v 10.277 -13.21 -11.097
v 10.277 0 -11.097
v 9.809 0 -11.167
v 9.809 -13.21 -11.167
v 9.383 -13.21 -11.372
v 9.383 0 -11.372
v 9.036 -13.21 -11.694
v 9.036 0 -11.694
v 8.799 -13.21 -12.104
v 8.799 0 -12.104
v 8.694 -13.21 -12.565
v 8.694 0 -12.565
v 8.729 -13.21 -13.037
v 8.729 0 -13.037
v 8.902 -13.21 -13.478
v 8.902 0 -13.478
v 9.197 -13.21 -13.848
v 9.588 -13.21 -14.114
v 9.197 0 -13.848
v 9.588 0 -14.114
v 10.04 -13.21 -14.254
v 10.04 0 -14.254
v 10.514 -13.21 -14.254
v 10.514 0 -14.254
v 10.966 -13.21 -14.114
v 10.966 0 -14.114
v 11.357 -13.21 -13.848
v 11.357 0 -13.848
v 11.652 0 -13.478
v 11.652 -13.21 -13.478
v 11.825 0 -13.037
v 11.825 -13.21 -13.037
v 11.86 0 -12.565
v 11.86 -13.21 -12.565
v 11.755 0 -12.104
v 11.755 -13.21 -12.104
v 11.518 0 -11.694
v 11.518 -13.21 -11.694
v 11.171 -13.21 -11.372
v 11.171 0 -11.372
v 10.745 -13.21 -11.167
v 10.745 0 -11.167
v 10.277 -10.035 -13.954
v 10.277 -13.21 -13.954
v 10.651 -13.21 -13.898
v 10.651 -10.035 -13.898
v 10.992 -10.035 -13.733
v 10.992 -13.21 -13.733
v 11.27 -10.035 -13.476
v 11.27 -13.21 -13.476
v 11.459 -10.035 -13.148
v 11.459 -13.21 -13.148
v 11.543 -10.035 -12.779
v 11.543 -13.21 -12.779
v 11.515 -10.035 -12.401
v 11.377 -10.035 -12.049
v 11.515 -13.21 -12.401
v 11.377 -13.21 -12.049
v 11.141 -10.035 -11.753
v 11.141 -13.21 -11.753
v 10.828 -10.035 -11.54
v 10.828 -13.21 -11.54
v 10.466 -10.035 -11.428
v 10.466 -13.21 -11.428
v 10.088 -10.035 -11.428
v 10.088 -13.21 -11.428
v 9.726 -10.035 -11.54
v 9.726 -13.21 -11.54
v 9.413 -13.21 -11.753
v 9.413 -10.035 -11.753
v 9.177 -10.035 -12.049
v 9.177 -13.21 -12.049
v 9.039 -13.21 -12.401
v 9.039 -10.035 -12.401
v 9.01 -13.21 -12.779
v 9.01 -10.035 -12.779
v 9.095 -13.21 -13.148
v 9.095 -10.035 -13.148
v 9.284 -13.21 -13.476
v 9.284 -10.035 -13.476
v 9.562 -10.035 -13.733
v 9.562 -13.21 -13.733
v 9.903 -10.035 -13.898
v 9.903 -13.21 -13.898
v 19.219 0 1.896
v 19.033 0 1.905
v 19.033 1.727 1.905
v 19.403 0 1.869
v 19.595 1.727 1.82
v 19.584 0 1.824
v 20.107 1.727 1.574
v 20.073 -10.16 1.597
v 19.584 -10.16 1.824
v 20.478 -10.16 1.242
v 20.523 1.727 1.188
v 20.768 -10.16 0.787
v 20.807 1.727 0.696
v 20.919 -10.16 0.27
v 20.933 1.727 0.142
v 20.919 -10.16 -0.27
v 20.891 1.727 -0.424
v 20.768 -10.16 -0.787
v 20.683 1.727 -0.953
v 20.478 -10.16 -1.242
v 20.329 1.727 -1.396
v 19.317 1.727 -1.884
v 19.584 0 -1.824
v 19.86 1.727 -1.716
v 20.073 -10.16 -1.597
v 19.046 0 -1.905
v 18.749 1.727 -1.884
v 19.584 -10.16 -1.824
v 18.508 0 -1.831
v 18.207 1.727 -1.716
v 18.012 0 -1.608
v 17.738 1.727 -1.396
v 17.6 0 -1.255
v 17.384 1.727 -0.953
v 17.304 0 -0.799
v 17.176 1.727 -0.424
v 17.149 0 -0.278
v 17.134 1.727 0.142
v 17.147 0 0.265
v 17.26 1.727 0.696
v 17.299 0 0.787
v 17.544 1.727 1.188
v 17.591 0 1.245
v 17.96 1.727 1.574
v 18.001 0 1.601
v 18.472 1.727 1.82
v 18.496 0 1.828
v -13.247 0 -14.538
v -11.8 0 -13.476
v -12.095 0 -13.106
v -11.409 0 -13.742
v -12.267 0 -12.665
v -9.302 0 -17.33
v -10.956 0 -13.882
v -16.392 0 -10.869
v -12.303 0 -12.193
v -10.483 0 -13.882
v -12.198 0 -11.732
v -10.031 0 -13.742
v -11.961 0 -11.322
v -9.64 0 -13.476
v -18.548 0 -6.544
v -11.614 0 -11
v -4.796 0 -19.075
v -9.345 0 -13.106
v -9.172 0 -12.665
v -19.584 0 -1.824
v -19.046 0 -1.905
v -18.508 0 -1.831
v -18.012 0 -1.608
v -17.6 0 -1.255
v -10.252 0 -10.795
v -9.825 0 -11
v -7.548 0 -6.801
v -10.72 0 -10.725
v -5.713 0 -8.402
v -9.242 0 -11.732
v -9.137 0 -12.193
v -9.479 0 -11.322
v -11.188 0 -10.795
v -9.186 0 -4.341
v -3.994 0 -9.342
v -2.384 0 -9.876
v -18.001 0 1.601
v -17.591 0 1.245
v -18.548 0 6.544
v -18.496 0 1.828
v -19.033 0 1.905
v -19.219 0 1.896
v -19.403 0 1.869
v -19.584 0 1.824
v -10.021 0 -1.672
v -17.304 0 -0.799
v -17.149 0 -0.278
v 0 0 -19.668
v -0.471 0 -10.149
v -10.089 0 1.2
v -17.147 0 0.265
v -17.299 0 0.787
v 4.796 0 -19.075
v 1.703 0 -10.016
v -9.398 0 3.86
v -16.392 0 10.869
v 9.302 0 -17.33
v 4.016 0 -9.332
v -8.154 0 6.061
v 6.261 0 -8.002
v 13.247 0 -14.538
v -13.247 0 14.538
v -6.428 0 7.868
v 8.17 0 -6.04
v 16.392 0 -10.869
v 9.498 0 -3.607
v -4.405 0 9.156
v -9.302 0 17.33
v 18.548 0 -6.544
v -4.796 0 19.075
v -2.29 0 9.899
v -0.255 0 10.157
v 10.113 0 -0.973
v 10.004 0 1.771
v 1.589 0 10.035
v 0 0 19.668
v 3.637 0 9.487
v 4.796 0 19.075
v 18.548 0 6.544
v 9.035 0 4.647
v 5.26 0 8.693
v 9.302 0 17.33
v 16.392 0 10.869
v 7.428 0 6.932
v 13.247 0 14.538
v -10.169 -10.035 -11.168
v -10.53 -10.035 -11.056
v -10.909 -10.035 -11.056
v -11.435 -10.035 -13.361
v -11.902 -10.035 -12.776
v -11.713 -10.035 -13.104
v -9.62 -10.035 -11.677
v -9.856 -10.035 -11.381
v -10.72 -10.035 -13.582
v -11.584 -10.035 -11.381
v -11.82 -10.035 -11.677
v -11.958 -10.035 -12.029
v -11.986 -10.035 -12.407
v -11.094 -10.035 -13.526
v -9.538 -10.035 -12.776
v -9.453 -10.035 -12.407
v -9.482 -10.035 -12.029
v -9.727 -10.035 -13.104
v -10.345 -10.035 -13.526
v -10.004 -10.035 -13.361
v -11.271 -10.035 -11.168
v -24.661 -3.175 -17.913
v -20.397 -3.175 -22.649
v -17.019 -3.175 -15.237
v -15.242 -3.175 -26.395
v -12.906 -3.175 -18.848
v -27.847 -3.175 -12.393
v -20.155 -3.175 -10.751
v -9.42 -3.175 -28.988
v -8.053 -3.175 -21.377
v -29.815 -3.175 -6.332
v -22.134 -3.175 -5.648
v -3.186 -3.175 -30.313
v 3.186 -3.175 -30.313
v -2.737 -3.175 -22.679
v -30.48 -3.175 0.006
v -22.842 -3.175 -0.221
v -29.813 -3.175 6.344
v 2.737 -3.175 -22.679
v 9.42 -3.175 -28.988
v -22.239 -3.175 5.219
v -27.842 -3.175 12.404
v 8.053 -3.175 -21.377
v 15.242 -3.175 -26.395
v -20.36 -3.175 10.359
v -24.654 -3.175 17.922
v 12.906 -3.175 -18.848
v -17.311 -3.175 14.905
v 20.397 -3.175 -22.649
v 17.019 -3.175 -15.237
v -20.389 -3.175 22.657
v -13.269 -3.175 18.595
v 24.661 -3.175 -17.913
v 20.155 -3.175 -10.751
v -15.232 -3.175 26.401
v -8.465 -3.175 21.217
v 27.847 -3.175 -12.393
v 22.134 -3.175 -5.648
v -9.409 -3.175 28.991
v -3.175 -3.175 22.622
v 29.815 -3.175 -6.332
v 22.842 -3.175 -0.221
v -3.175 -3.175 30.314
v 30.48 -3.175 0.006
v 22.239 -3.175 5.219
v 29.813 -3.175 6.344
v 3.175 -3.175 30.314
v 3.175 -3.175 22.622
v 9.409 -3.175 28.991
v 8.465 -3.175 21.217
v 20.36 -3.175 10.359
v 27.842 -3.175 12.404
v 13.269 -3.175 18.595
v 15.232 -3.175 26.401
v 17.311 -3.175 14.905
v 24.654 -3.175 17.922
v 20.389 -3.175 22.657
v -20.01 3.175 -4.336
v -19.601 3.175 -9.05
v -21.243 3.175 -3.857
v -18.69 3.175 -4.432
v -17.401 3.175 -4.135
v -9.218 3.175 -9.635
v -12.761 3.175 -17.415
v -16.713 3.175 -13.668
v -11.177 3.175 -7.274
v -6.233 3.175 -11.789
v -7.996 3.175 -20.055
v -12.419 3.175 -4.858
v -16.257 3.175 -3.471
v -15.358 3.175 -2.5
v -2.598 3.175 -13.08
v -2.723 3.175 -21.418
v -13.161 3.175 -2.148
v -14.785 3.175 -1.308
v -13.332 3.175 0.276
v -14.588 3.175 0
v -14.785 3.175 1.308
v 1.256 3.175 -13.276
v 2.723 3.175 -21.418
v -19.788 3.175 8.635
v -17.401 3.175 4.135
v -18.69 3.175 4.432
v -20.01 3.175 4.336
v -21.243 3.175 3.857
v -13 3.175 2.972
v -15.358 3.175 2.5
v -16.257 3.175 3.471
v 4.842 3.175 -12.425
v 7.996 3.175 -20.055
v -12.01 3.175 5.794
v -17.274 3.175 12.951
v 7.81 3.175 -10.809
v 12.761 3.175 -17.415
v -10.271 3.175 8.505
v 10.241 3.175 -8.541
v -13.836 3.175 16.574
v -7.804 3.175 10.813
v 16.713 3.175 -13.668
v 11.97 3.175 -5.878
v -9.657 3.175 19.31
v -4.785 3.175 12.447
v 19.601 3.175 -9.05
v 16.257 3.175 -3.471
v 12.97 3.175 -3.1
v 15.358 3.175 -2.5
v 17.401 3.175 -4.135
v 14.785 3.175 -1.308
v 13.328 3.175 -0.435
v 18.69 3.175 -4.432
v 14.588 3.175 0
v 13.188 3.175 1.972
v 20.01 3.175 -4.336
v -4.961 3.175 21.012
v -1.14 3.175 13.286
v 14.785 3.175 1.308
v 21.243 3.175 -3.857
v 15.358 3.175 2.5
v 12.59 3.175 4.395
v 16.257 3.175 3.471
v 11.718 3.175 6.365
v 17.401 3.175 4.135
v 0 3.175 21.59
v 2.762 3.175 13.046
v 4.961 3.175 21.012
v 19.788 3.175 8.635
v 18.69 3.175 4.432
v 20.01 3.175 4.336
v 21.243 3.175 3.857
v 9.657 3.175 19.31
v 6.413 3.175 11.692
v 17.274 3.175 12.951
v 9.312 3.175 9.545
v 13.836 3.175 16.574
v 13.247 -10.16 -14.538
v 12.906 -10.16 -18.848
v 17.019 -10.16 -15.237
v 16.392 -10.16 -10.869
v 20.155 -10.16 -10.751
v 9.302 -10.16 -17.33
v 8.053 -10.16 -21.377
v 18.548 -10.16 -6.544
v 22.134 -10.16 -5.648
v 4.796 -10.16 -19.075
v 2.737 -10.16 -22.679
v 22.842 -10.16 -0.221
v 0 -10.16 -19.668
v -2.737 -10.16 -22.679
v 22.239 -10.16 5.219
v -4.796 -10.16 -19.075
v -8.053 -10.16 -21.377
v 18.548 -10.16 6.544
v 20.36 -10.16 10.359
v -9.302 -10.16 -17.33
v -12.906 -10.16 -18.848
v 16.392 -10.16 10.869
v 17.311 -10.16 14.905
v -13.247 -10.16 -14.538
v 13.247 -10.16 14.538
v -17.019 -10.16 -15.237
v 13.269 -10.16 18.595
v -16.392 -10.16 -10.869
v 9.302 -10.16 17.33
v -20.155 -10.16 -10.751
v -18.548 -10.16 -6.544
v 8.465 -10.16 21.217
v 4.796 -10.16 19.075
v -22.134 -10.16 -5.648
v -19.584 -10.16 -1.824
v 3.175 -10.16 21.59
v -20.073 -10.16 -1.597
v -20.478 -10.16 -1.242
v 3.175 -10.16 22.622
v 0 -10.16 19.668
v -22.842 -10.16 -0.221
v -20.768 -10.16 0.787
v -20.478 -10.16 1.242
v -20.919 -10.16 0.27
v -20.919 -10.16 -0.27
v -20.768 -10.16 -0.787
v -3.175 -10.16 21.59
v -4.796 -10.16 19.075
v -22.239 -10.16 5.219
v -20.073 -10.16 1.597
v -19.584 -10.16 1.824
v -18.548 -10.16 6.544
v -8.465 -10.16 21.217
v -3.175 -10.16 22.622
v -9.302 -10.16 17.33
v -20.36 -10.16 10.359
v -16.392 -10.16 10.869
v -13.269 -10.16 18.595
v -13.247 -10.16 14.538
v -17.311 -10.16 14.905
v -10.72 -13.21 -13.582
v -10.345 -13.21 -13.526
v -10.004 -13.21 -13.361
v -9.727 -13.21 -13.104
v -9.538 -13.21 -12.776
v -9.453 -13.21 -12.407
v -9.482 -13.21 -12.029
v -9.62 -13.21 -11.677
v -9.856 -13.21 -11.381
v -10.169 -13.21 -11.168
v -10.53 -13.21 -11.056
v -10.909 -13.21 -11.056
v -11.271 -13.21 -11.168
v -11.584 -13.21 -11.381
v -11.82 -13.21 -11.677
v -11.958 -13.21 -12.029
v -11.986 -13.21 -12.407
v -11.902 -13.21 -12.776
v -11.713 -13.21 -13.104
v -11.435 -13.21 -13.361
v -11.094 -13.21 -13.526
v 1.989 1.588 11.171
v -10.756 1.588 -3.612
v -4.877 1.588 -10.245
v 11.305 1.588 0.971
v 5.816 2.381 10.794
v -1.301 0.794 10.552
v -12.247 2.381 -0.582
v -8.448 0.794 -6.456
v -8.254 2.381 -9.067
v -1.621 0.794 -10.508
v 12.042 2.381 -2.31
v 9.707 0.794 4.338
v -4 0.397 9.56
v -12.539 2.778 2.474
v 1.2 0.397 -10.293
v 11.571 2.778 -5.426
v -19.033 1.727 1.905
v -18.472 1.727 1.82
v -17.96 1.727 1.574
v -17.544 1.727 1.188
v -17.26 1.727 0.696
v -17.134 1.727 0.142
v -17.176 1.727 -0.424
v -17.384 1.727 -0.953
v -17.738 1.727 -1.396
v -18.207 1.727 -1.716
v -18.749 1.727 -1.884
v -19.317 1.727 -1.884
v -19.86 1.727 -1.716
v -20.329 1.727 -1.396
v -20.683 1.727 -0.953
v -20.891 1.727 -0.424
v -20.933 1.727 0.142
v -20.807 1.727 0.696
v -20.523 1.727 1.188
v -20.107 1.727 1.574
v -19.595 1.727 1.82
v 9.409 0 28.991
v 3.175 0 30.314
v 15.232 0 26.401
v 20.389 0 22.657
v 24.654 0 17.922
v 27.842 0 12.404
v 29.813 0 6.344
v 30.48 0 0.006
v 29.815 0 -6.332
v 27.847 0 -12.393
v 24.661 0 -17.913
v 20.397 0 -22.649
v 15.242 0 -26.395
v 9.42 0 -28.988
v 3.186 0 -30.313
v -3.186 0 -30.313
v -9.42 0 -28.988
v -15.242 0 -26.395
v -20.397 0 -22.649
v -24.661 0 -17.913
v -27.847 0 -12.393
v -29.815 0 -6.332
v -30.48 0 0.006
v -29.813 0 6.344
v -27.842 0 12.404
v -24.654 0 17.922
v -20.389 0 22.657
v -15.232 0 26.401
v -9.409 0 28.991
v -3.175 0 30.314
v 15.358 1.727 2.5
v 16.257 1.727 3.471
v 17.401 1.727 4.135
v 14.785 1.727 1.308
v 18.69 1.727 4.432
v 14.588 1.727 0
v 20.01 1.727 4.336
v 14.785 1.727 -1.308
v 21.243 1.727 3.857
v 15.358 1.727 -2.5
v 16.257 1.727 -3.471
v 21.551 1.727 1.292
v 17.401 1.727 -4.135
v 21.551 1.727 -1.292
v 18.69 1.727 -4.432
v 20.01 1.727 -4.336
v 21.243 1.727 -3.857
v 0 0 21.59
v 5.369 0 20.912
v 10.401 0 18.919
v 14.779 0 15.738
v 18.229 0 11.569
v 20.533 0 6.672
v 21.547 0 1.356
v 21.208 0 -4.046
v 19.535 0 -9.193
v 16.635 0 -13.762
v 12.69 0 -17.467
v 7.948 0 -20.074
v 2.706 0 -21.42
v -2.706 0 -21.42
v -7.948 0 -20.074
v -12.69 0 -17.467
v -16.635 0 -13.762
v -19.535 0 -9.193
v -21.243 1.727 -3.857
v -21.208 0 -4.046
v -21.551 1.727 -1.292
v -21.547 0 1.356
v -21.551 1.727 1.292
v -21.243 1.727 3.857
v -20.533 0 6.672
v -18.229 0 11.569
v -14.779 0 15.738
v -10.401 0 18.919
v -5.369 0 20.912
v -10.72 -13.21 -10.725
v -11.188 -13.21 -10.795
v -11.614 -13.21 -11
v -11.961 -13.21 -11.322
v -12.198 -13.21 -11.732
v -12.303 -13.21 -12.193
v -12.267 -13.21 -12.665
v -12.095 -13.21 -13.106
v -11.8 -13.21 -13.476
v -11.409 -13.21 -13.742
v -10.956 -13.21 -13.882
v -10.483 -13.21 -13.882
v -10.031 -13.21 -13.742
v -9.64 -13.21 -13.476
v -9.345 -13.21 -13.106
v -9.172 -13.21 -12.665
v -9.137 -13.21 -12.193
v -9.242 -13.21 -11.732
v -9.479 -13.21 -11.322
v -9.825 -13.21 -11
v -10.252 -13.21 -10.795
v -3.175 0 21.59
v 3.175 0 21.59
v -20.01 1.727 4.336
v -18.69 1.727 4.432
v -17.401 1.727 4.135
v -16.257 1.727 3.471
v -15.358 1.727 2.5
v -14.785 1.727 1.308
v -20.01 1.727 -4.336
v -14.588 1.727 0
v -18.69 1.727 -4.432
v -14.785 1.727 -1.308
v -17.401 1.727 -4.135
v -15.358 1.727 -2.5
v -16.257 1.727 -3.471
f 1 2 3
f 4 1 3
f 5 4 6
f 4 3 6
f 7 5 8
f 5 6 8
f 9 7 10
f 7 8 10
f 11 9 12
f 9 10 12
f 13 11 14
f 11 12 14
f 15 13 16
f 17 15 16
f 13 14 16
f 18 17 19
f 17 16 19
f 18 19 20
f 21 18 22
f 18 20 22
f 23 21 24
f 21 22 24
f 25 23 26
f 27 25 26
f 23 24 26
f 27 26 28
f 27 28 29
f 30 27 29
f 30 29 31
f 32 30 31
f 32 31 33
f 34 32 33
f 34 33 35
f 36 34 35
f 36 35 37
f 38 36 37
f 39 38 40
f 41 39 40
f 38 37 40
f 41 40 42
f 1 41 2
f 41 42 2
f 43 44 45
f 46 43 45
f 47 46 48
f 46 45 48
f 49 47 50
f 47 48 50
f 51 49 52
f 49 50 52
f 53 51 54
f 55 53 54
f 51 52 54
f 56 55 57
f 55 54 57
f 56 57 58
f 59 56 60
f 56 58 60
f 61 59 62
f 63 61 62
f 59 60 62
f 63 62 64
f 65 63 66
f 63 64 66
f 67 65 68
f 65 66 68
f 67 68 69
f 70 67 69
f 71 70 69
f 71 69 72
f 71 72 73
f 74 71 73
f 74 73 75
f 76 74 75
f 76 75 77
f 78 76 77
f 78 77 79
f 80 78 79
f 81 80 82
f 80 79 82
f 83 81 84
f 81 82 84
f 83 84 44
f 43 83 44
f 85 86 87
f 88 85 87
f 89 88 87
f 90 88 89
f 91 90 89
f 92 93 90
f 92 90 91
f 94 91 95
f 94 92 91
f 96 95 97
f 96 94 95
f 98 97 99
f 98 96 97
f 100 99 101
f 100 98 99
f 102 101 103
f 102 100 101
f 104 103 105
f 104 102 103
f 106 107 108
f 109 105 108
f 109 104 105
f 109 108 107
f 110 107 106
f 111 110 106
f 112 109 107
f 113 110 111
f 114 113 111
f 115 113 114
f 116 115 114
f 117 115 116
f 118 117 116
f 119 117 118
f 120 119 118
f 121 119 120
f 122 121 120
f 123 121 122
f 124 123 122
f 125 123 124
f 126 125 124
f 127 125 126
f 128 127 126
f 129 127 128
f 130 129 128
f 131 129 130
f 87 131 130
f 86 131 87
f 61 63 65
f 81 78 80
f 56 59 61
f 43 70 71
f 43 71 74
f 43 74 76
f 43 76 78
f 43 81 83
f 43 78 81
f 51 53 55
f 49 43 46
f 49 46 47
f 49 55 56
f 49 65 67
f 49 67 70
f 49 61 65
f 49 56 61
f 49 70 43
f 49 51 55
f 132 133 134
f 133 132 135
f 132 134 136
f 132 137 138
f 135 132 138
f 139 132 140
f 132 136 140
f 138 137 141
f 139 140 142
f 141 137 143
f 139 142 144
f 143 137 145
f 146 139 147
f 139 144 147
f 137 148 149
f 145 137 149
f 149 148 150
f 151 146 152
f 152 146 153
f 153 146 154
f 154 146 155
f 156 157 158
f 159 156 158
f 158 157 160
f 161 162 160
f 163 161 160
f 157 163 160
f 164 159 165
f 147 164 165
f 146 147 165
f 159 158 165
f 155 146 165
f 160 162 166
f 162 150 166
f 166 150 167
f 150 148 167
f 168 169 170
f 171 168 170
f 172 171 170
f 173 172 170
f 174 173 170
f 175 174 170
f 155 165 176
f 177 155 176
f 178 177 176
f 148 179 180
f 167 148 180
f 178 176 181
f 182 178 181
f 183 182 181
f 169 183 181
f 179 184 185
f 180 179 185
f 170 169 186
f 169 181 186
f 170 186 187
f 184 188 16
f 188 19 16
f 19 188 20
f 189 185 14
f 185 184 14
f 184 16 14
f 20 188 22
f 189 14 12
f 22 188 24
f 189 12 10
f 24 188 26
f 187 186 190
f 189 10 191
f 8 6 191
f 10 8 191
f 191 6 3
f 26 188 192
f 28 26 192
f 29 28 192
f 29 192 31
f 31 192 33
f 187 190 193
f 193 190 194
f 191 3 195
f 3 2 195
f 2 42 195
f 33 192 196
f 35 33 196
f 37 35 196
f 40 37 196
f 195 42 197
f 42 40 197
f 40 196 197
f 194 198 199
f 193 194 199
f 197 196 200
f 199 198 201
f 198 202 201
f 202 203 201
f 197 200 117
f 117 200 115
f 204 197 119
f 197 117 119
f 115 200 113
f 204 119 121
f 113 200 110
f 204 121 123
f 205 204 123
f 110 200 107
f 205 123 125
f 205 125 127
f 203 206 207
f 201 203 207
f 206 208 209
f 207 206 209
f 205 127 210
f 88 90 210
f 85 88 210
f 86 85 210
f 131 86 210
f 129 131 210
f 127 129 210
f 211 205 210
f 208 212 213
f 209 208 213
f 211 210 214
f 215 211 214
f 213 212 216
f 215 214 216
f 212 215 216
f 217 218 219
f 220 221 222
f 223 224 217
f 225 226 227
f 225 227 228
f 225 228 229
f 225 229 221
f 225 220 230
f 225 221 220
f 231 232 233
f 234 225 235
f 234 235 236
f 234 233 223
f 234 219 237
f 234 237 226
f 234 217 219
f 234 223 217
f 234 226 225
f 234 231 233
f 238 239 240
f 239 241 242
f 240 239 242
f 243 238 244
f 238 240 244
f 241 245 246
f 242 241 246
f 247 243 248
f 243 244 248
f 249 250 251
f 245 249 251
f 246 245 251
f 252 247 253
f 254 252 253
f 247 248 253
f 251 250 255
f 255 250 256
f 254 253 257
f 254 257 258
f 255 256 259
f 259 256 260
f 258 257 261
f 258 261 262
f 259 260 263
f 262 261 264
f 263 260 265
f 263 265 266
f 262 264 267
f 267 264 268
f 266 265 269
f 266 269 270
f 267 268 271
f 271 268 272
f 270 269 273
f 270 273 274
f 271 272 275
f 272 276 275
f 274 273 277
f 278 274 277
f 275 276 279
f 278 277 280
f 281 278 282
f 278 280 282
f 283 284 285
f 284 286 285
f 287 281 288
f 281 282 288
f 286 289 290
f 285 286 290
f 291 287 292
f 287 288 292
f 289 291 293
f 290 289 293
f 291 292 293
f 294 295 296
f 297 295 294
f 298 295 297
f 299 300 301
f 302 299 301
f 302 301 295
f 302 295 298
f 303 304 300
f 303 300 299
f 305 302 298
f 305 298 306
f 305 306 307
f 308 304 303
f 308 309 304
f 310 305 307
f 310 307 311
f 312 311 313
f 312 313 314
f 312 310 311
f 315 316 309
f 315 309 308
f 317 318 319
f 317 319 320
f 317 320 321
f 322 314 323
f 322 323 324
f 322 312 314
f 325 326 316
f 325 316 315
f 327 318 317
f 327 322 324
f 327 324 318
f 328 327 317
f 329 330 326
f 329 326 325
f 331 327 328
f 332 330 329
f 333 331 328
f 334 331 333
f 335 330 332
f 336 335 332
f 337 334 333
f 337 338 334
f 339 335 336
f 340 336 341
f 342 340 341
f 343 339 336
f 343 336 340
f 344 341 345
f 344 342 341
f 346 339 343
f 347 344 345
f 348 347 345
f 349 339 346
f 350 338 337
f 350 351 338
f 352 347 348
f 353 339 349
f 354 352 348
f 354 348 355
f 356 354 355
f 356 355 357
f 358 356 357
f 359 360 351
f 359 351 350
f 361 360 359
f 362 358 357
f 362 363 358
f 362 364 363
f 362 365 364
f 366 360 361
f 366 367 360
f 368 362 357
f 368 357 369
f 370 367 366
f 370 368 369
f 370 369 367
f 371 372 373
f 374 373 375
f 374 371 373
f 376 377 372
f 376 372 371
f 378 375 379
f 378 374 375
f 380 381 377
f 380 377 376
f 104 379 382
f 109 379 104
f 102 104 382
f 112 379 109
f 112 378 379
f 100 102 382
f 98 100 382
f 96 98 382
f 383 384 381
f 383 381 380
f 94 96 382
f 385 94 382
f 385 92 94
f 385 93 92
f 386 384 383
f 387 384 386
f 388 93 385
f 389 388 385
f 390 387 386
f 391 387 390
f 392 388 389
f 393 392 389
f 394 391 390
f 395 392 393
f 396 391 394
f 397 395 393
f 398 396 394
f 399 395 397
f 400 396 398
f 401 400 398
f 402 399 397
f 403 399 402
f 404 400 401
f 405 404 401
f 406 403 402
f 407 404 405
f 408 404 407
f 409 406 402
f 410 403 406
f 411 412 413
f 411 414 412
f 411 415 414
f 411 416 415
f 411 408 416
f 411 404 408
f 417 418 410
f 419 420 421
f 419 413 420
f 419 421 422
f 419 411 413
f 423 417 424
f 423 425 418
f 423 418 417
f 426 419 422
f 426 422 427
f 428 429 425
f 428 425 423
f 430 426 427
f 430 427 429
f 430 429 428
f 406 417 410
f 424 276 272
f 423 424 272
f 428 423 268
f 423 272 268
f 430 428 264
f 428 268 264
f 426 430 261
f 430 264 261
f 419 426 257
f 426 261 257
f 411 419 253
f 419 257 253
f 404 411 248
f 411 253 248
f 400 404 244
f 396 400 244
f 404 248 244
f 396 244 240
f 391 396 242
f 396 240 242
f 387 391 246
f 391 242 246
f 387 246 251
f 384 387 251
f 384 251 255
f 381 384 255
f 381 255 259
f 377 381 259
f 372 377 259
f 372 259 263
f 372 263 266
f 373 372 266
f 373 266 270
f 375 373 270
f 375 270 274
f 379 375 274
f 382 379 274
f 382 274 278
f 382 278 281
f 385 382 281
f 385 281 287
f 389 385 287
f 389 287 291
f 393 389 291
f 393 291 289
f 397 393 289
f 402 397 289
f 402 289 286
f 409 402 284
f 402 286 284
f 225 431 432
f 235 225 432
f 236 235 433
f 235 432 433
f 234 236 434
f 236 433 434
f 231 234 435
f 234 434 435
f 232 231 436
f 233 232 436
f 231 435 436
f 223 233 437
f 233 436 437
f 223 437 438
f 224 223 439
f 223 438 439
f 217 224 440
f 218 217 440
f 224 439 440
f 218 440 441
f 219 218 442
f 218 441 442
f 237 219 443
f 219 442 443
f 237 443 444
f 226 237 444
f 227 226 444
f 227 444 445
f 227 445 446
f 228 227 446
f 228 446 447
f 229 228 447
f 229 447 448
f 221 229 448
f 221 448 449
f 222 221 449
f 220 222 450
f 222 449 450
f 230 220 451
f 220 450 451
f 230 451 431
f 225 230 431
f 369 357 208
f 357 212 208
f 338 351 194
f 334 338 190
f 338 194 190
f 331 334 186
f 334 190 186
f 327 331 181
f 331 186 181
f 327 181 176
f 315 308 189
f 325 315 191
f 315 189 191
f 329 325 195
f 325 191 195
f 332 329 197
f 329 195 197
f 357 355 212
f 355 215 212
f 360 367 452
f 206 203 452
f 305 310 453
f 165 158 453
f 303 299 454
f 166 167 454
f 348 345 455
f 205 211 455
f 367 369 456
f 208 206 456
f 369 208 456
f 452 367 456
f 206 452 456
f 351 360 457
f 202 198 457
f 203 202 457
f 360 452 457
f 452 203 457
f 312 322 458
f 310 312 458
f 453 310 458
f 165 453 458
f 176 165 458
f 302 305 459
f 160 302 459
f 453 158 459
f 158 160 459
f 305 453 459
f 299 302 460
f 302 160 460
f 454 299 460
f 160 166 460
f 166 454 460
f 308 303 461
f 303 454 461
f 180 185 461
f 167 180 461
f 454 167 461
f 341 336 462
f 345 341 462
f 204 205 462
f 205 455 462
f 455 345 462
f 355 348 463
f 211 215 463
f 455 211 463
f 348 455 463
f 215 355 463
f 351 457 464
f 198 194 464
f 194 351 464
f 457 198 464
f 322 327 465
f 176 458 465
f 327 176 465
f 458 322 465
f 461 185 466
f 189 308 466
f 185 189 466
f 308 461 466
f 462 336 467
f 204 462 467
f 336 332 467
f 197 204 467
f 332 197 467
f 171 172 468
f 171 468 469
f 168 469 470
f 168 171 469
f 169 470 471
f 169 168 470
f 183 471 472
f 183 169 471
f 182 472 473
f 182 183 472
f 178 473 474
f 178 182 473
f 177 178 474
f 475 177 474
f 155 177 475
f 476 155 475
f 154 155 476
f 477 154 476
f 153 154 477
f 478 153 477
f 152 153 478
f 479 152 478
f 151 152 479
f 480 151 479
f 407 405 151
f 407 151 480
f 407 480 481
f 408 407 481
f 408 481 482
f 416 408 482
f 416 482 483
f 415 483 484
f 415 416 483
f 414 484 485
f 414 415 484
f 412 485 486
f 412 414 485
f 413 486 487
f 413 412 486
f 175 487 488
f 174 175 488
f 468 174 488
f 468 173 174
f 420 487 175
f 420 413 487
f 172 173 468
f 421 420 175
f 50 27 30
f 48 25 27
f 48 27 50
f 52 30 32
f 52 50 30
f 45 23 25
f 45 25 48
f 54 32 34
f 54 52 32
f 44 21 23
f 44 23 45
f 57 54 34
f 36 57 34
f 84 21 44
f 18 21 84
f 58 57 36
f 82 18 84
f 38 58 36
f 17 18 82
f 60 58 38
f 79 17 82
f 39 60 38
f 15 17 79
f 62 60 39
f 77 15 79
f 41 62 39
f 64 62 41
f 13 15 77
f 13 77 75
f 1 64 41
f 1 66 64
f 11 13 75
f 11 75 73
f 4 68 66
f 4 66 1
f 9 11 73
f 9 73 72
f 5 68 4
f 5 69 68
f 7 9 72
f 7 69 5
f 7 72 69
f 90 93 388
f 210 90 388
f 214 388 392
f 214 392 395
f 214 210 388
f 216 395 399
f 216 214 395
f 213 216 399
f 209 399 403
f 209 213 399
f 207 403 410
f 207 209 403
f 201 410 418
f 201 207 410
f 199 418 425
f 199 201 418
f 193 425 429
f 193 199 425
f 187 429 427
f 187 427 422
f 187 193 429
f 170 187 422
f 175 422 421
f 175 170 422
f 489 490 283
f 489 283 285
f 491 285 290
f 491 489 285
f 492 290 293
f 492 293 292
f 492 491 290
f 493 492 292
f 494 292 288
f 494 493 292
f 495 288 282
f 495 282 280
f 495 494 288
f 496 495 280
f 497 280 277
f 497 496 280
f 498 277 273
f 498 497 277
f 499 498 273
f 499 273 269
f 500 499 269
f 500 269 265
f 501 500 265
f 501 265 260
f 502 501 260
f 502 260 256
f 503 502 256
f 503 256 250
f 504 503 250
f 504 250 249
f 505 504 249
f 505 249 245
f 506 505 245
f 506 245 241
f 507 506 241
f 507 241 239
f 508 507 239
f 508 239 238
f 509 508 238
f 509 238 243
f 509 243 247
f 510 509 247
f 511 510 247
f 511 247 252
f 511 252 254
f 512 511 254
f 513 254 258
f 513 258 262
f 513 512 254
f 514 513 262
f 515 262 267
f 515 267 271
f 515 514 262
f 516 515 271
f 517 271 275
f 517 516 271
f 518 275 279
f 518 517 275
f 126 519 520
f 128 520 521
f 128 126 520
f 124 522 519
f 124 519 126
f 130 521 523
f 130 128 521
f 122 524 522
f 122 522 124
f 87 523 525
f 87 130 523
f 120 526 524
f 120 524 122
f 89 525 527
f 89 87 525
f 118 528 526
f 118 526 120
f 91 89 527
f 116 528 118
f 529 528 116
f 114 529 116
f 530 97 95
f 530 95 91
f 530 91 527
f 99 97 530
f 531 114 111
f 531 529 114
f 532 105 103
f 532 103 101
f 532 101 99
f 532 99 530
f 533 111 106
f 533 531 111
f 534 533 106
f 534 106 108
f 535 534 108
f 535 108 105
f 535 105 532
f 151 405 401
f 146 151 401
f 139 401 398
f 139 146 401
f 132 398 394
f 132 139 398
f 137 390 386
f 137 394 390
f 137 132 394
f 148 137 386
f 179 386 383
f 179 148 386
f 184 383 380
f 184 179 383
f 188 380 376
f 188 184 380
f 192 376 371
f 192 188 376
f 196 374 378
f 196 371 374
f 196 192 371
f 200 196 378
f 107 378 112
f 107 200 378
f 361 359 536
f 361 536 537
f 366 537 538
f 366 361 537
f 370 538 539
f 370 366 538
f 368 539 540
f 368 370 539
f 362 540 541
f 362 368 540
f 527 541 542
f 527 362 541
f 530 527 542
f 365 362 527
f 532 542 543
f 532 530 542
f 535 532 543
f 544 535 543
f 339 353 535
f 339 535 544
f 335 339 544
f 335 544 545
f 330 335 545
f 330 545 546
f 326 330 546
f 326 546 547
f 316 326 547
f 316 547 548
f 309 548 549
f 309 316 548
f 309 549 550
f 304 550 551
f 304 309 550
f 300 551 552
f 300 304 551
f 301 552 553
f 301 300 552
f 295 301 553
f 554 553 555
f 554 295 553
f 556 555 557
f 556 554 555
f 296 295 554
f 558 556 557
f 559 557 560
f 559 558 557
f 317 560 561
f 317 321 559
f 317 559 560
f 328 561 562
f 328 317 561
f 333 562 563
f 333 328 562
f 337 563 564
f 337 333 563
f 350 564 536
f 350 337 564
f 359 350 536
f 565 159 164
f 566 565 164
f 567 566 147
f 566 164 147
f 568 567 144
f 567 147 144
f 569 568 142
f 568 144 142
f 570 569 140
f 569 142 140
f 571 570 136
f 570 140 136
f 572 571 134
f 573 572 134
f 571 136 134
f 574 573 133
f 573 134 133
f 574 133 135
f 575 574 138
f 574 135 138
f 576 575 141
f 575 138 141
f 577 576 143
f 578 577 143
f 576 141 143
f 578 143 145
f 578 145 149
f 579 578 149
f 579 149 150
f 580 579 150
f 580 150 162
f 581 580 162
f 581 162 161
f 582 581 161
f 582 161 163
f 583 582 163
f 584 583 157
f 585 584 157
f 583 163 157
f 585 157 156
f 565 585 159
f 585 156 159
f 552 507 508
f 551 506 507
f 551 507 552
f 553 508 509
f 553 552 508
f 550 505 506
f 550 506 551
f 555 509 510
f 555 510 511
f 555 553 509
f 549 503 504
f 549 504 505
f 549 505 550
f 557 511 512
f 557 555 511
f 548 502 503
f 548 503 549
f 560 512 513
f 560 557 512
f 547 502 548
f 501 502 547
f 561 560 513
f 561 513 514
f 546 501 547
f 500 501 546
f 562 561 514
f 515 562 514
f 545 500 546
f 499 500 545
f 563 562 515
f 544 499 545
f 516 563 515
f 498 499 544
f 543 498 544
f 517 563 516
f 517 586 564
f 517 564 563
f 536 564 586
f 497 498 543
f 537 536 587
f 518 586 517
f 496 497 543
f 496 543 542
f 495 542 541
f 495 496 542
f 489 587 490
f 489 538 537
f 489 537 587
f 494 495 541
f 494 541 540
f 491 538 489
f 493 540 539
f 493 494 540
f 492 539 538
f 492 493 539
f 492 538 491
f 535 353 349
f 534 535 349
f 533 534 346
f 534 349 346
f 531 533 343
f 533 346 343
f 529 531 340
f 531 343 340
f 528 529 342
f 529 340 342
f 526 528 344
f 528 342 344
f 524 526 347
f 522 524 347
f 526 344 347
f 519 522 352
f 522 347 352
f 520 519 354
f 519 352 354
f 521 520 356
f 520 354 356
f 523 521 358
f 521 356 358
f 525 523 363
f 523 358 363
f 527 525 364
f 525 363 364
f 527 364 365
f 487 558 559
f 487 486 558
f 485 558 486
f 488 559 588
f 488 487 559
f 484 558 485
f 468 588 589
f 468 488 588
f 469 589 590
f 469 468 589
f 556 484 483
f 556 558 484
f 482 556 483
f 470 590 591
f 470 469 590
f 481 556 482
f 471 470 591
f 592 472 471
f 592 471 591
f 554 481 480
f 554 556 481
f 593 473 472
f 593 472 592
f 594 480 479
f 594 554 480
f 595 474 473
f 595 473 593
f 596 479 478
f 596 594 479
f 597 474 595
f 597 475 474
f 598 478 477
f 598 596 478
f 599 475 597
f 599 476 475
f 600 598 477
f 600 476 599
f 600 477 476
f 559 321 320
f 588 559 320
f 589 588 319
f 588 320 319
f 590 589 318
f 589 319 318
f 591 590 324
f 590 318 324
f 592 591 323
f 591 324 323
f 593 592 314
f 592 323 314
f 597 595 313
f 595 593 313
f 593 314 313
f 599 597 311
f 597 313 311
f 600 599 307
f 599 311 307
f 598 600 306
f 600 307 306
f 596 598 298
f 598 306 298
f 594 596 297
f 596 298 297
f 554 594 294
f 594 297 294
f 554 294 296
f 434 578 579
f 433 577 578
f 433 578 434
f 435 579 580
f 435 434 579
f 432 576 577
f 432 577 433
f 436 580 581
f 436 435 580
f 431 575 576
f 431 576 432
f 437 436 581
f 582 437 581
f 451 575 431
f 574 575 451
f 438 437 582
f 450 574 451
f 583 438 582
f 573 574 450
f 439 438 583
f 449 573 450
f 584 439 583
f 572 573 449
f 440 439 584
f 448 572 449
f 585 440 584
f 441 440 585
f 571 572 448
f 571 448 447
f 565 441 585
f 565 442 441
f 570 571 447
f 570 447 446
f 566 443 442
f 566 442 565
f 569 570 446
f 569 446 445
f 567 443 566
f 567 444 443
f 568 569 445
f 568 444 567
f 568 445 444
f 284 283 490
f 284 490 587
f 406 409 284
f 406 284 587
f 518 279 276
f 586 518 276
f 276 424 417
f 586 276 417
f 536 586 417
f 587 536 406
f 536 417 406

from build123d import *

# Parameters (mm, degrees)
SKETCH5_R               = 22.843403387
SKETCH5_R_2             = 13.335
BOSS_EXTRUDE2_DEPTH     = 3.175
SKETCH8_R               = 22.843403387
SKETCH8_R_2             = 19.668403387
BOSS_EXTRUDE3_DEPTH     = 10.16
CUT_EXTRUDE2_DEPTH      = 35.949454799
CUT_EXTRUDE2_DEPTH_BACK = 35.949454799
SKETCH9_R               = 1.905
SKETCH11_R              = 22.843403387
SKETCH11_R_2            = 21.59
CUT_EXTRUDE3_DEPTH      = 3.175
SKETCH12_R              = 30.48
SKETCH12_R_2            = 21.59
BOSS_EXTRUDE4_DEPTH     = 3.175
CUT_EXTRUDE4_DEPTH      = 45.286413266
CUT_EXTRUDE4_DEPTH_BACK = 45.286413266
SKETCH13_W              = 6.35
SKETCH13_H              = 8.89
SKETCH14_R              = 4.445
CUT_EXTRUDE5_DEPTH      = 1.4478
SKETCH15_R              = 1.5875
BOSS_EXTRUDE5_DEPTH     = 13.21
SKETCH16_R              = 1.27
CUT_EXTRUDE6_DEPTH      = 3.175


with BuildPart() as part:
    # Loft1: read off the stored shape, not the designer's step
    # Loft1: loft between two sections, ruled curve by curve
    loft1_from = [
        Edge.make_bspline([(10.081206282, 0, 5.386481216), (20.854168715, 0, -14.775931349), (0.69175615, 0, -25.548893781), (-10.081206282, 0, -5.386481216), (-20.854168715, 0, 14.775931349), (-0.69175615, 0, 25.548893781), (10.081206282, 0, 5.386481216)], [0, 0, 0, 0, 0.5, 0.5, 0.5, 1, 1, 1, 1], 3, [1, 0.333333333, 0.333333333, 1, 0.333333333, 0.333333333, 1]),
    ]
    loft1_to = [
        Edge.make_bspline([(16.298540151, 3.175, 2.633949306), (21.566438762, 3.175, -29.963130997), (-11.03064154, 3.175, -35.231029608), (-16.298540151, 3.175, -2.633949306), (-21.566438762, 3.175, 29.963130997), (11.03064154, 3.175, 35.231029608), (16.298540151, 3.175, 2.633949306)], [0, 0, 0, 0, 0.5, 0.5, 0.5, 1, 1, 1, 1], 3, [1, 0.333333333, 0.333333333, 1, 0.333333333, 0.333333333, 1]),
    ]
    loft1 = Solid(Shell([*[Face.make_surface_from_curves(loft1_from[k], loft1_to[k]) for k in range(1)], Face(Wire(loft1_from)), Face(Wire(loft1_to))]))
    add(loft1)

    # Cut-Loft1: read off the stored shape, not the designer's step
    # Cut-Loft1: loft between two sections, ruled curve by curve
    cut_loft1_from = [
        Edge.make_bspline([(11.717693295, 3.175, 6.365366356), (-1.013039416, 3.175, 29.800752946), (-24.448426006, 3.175, 17.070020235), (-11.717693295, 3.175, -6.365366356), (1.013039416, 3.175, -29.800752946), (24.448426006, 3.175, -17.070020235), (11.717693295, 3.175, 6.365366356)], [0, 0, 0, 0, 0.5, 0.5, 0.5, 1, 1, 1, 1], 3, [1, 0.333333333, 0.333333333, 1, 0.333333333, 0.333333333, 1]),
    ]
    cut_loft1_to = [
        Edge.make_bspline([(5.259513685, 0, 8.692704746), (-12.125895806, 0, 19.211732116), (-22.644923177, 0, 1.826322624), (-5.259513685, 0, -8.692704746), (12.125895806, 0, -19.211732116), (22.644923177, 0, -1.826322624), (5.259513685, 0, 8.692704746)], [0, 0, 0, 0, 0.5, 0.5, 0.5, 1, 1, 1, 1], 3, [1, 0.333333333, 0.333333333, 1, 0.333333333, 0.333333333, 1]),
    ]
    cut_loft1 = Solid(Shell([*[Face.make_surface_from_curves(cut_loft1_from[k], cut_loft1_to[k]) for k in range(1)], Face(Wire(cut_loft1_from)), Face(Wire(cut_loft1_to))]))
    add(cut_loft1, mode=Mode.SUBTRACT)

    # Sketch5 → Boss-Extrude2 (add)
    with BuildSketch(Plane(origin=(0, 3.175, 0), x_dir=(1, 0, 0), z_dir=(0, 1, 0))):
        with Locations(Location((0, 0, 0), (0, 0, 270))):
            Circle(SKETCH5_R)
        with Locations(Location((0, 0, 0), (0, 0, 270))):
            Circle(SKETCH5_R_2, mode=Mode.SUBTRACT)
    extrude(amount=-BOSS_EXTRUDE2_DEPTH)

    # Sketch10 → Revolve4 (revolve)
    with BuildSketch(Plane.XY):
        Polygon((-13.335, 1.305724577), (-10.16, 0), (-13.335, 0), align=None)
    revolve(axis=Axis((0, -10.16, 0), (0, 1, 0)))

    # Sketch8 → Boss-Extrude3 (add)
    with BuildSketch(Plane(origin=(0, 0, 0), x_dir=(-1, 0, 0), z_dir=(0, -1, 0))):
        with Locations(Location((0, 0, 0), (0, 0, 270))):
            Circle(SKETCH8_R)
        with Locations(Location((0, 0, 0), (0, 0, 90))):
            Circle(SKETCH8_R_2, mode=Mode.SUBTRACT)
    extrude(amount=BOSS_EXTRUDE3_DEPTH)

    # Sketch9 → Cut-Extrude2 (cut, two sides: drawn at the far end of the back side and taken through both)
    with BuildSketch(Plane(origin=(0, 3.175, 0), x_dir=(1, 0, 0), z_dir=(0, 1, 0)).offset(-CUT_EXTRUDE2_DEPTH_BACK)):
        with Locations(Location((19.033403387, 0, 0), (0, 0, 270))):
            Circle(SKETCH9_R)
        with Locations(Location((-19.033403387, 0, 0), (0, 0, 270))):
            Circle(SKETCH9_R)
    extrude(amount=CUT_EXTRUDE2_DEPTH + CUT_EXTRUDE2_DEPTH_BACK, mode=Mode.SUBTRACT)

    # Sketch11 → Cut-Extrude3 (cut)
    with BuildSketch(Plane(origin=(0, 3.175, 0), x_dir=(1, 0, 0), z_dir=(0, 1, 0))):
        with Locations(Location((0, 0, 0), (0, 0, 270))):
            Circle(SKETCH11_R)
        with Locations(Location((0, 0, 0), (0, 0, 270))):
            Circle(SKETCH11_R_2, mode=Mode.SUBTRACT)
    extrude(amount=-CUT_EXTRUDE3_DEPTH, mode=Mode.SUBTRACT)

    # Sketch12 → Boss-Extrude4 (add)
    with BuildSketch(Plane(origin=(0, 0, 0), x_dir=(1, 0, 0), z_dir=(0, 1, 0))):
        with Locations(Location((0, 0, 0), (0, 0, 270))):
            Circle(SKETCH12_R)
        with Locations(Location((0, 0, 0), (0, 0, 270))):
            Circle(SKETCH12_R_2, mode=Mode.SUBTRACT)
    extrude(amount=-BOSS_EXTRUDE4_DEPTH)

    # Sketch13 → Cut-Extrude4 (cut, two sides: drawn at the far end of the back side and taken through both)
    with BuildSketch(Plane(origin=(0, 0, 0), x_dir=(1, 0, 0), z_dir=(0, 1, 0)).offset(-CUT_EXTRUDE4_DEPTH_BACK)):
        with Locations((0, -26.035)):
            Rectangle(SKETCH13_W, SKETCH13_H)
    extrude(amount=CUT_EXTRUDE4_DEPTH + CUT_EXTRUDE4_DEPTH_BACK, mode=Mode.SUBTRACT)

    # Sketch14 → Cut-Extrude5 (cut)
    with BuildSketch(Plane(origin=(0, 3.175, 0), x_dir=(1, 0, 0), z_dir=(0, 1, 0))):
        with Locations((-19.033403387, 0)):
            Circle(SKETCH14_R)
        with Locations((19.033403387, 0)):
            Circle(SKETCH14_R)
    extrude(amount=-CUT_EXTRUDE5_DEPTH, mode=Mode.SUBTRACT)

    # Sketch15 → Boss-Extrude5 (add)
    with BuildSketch(Plane.XZ):
        with Locations(Location((10.276942125, -12.684023832, 0), (0, 0, 90))):
            Circle(SKETCH15_R)
        with Locations(Location((-10.719763295, -12.312054049, 0), (0, 0, 90))):
            Circle(SKETCH15_R)
    extrude(amount=BOSS_EXTRUDE5_DEPTH)

    # Sketch16 → Cut-Extrude6 (cut)
    with BuildSketch(Plane(origin=(0, -13.21, 0), x_dir=(-1, 0, 0), z_dir=(0, -1, 0))):
        with Locations(Location((10.719763295, 12.312054049, 0), (0, 0, 90))):
            Circle(SKETCH16_R)
        with Locations(Location((-10.276942125, 12.684023832, 0), (0, 0, 90))):
            Circle(SKETCH16_R)
    extrude(amount=-CUT_EXTRUDE6_DEPTH, mode=Mode.SUBTRACT)


solid = part.part
